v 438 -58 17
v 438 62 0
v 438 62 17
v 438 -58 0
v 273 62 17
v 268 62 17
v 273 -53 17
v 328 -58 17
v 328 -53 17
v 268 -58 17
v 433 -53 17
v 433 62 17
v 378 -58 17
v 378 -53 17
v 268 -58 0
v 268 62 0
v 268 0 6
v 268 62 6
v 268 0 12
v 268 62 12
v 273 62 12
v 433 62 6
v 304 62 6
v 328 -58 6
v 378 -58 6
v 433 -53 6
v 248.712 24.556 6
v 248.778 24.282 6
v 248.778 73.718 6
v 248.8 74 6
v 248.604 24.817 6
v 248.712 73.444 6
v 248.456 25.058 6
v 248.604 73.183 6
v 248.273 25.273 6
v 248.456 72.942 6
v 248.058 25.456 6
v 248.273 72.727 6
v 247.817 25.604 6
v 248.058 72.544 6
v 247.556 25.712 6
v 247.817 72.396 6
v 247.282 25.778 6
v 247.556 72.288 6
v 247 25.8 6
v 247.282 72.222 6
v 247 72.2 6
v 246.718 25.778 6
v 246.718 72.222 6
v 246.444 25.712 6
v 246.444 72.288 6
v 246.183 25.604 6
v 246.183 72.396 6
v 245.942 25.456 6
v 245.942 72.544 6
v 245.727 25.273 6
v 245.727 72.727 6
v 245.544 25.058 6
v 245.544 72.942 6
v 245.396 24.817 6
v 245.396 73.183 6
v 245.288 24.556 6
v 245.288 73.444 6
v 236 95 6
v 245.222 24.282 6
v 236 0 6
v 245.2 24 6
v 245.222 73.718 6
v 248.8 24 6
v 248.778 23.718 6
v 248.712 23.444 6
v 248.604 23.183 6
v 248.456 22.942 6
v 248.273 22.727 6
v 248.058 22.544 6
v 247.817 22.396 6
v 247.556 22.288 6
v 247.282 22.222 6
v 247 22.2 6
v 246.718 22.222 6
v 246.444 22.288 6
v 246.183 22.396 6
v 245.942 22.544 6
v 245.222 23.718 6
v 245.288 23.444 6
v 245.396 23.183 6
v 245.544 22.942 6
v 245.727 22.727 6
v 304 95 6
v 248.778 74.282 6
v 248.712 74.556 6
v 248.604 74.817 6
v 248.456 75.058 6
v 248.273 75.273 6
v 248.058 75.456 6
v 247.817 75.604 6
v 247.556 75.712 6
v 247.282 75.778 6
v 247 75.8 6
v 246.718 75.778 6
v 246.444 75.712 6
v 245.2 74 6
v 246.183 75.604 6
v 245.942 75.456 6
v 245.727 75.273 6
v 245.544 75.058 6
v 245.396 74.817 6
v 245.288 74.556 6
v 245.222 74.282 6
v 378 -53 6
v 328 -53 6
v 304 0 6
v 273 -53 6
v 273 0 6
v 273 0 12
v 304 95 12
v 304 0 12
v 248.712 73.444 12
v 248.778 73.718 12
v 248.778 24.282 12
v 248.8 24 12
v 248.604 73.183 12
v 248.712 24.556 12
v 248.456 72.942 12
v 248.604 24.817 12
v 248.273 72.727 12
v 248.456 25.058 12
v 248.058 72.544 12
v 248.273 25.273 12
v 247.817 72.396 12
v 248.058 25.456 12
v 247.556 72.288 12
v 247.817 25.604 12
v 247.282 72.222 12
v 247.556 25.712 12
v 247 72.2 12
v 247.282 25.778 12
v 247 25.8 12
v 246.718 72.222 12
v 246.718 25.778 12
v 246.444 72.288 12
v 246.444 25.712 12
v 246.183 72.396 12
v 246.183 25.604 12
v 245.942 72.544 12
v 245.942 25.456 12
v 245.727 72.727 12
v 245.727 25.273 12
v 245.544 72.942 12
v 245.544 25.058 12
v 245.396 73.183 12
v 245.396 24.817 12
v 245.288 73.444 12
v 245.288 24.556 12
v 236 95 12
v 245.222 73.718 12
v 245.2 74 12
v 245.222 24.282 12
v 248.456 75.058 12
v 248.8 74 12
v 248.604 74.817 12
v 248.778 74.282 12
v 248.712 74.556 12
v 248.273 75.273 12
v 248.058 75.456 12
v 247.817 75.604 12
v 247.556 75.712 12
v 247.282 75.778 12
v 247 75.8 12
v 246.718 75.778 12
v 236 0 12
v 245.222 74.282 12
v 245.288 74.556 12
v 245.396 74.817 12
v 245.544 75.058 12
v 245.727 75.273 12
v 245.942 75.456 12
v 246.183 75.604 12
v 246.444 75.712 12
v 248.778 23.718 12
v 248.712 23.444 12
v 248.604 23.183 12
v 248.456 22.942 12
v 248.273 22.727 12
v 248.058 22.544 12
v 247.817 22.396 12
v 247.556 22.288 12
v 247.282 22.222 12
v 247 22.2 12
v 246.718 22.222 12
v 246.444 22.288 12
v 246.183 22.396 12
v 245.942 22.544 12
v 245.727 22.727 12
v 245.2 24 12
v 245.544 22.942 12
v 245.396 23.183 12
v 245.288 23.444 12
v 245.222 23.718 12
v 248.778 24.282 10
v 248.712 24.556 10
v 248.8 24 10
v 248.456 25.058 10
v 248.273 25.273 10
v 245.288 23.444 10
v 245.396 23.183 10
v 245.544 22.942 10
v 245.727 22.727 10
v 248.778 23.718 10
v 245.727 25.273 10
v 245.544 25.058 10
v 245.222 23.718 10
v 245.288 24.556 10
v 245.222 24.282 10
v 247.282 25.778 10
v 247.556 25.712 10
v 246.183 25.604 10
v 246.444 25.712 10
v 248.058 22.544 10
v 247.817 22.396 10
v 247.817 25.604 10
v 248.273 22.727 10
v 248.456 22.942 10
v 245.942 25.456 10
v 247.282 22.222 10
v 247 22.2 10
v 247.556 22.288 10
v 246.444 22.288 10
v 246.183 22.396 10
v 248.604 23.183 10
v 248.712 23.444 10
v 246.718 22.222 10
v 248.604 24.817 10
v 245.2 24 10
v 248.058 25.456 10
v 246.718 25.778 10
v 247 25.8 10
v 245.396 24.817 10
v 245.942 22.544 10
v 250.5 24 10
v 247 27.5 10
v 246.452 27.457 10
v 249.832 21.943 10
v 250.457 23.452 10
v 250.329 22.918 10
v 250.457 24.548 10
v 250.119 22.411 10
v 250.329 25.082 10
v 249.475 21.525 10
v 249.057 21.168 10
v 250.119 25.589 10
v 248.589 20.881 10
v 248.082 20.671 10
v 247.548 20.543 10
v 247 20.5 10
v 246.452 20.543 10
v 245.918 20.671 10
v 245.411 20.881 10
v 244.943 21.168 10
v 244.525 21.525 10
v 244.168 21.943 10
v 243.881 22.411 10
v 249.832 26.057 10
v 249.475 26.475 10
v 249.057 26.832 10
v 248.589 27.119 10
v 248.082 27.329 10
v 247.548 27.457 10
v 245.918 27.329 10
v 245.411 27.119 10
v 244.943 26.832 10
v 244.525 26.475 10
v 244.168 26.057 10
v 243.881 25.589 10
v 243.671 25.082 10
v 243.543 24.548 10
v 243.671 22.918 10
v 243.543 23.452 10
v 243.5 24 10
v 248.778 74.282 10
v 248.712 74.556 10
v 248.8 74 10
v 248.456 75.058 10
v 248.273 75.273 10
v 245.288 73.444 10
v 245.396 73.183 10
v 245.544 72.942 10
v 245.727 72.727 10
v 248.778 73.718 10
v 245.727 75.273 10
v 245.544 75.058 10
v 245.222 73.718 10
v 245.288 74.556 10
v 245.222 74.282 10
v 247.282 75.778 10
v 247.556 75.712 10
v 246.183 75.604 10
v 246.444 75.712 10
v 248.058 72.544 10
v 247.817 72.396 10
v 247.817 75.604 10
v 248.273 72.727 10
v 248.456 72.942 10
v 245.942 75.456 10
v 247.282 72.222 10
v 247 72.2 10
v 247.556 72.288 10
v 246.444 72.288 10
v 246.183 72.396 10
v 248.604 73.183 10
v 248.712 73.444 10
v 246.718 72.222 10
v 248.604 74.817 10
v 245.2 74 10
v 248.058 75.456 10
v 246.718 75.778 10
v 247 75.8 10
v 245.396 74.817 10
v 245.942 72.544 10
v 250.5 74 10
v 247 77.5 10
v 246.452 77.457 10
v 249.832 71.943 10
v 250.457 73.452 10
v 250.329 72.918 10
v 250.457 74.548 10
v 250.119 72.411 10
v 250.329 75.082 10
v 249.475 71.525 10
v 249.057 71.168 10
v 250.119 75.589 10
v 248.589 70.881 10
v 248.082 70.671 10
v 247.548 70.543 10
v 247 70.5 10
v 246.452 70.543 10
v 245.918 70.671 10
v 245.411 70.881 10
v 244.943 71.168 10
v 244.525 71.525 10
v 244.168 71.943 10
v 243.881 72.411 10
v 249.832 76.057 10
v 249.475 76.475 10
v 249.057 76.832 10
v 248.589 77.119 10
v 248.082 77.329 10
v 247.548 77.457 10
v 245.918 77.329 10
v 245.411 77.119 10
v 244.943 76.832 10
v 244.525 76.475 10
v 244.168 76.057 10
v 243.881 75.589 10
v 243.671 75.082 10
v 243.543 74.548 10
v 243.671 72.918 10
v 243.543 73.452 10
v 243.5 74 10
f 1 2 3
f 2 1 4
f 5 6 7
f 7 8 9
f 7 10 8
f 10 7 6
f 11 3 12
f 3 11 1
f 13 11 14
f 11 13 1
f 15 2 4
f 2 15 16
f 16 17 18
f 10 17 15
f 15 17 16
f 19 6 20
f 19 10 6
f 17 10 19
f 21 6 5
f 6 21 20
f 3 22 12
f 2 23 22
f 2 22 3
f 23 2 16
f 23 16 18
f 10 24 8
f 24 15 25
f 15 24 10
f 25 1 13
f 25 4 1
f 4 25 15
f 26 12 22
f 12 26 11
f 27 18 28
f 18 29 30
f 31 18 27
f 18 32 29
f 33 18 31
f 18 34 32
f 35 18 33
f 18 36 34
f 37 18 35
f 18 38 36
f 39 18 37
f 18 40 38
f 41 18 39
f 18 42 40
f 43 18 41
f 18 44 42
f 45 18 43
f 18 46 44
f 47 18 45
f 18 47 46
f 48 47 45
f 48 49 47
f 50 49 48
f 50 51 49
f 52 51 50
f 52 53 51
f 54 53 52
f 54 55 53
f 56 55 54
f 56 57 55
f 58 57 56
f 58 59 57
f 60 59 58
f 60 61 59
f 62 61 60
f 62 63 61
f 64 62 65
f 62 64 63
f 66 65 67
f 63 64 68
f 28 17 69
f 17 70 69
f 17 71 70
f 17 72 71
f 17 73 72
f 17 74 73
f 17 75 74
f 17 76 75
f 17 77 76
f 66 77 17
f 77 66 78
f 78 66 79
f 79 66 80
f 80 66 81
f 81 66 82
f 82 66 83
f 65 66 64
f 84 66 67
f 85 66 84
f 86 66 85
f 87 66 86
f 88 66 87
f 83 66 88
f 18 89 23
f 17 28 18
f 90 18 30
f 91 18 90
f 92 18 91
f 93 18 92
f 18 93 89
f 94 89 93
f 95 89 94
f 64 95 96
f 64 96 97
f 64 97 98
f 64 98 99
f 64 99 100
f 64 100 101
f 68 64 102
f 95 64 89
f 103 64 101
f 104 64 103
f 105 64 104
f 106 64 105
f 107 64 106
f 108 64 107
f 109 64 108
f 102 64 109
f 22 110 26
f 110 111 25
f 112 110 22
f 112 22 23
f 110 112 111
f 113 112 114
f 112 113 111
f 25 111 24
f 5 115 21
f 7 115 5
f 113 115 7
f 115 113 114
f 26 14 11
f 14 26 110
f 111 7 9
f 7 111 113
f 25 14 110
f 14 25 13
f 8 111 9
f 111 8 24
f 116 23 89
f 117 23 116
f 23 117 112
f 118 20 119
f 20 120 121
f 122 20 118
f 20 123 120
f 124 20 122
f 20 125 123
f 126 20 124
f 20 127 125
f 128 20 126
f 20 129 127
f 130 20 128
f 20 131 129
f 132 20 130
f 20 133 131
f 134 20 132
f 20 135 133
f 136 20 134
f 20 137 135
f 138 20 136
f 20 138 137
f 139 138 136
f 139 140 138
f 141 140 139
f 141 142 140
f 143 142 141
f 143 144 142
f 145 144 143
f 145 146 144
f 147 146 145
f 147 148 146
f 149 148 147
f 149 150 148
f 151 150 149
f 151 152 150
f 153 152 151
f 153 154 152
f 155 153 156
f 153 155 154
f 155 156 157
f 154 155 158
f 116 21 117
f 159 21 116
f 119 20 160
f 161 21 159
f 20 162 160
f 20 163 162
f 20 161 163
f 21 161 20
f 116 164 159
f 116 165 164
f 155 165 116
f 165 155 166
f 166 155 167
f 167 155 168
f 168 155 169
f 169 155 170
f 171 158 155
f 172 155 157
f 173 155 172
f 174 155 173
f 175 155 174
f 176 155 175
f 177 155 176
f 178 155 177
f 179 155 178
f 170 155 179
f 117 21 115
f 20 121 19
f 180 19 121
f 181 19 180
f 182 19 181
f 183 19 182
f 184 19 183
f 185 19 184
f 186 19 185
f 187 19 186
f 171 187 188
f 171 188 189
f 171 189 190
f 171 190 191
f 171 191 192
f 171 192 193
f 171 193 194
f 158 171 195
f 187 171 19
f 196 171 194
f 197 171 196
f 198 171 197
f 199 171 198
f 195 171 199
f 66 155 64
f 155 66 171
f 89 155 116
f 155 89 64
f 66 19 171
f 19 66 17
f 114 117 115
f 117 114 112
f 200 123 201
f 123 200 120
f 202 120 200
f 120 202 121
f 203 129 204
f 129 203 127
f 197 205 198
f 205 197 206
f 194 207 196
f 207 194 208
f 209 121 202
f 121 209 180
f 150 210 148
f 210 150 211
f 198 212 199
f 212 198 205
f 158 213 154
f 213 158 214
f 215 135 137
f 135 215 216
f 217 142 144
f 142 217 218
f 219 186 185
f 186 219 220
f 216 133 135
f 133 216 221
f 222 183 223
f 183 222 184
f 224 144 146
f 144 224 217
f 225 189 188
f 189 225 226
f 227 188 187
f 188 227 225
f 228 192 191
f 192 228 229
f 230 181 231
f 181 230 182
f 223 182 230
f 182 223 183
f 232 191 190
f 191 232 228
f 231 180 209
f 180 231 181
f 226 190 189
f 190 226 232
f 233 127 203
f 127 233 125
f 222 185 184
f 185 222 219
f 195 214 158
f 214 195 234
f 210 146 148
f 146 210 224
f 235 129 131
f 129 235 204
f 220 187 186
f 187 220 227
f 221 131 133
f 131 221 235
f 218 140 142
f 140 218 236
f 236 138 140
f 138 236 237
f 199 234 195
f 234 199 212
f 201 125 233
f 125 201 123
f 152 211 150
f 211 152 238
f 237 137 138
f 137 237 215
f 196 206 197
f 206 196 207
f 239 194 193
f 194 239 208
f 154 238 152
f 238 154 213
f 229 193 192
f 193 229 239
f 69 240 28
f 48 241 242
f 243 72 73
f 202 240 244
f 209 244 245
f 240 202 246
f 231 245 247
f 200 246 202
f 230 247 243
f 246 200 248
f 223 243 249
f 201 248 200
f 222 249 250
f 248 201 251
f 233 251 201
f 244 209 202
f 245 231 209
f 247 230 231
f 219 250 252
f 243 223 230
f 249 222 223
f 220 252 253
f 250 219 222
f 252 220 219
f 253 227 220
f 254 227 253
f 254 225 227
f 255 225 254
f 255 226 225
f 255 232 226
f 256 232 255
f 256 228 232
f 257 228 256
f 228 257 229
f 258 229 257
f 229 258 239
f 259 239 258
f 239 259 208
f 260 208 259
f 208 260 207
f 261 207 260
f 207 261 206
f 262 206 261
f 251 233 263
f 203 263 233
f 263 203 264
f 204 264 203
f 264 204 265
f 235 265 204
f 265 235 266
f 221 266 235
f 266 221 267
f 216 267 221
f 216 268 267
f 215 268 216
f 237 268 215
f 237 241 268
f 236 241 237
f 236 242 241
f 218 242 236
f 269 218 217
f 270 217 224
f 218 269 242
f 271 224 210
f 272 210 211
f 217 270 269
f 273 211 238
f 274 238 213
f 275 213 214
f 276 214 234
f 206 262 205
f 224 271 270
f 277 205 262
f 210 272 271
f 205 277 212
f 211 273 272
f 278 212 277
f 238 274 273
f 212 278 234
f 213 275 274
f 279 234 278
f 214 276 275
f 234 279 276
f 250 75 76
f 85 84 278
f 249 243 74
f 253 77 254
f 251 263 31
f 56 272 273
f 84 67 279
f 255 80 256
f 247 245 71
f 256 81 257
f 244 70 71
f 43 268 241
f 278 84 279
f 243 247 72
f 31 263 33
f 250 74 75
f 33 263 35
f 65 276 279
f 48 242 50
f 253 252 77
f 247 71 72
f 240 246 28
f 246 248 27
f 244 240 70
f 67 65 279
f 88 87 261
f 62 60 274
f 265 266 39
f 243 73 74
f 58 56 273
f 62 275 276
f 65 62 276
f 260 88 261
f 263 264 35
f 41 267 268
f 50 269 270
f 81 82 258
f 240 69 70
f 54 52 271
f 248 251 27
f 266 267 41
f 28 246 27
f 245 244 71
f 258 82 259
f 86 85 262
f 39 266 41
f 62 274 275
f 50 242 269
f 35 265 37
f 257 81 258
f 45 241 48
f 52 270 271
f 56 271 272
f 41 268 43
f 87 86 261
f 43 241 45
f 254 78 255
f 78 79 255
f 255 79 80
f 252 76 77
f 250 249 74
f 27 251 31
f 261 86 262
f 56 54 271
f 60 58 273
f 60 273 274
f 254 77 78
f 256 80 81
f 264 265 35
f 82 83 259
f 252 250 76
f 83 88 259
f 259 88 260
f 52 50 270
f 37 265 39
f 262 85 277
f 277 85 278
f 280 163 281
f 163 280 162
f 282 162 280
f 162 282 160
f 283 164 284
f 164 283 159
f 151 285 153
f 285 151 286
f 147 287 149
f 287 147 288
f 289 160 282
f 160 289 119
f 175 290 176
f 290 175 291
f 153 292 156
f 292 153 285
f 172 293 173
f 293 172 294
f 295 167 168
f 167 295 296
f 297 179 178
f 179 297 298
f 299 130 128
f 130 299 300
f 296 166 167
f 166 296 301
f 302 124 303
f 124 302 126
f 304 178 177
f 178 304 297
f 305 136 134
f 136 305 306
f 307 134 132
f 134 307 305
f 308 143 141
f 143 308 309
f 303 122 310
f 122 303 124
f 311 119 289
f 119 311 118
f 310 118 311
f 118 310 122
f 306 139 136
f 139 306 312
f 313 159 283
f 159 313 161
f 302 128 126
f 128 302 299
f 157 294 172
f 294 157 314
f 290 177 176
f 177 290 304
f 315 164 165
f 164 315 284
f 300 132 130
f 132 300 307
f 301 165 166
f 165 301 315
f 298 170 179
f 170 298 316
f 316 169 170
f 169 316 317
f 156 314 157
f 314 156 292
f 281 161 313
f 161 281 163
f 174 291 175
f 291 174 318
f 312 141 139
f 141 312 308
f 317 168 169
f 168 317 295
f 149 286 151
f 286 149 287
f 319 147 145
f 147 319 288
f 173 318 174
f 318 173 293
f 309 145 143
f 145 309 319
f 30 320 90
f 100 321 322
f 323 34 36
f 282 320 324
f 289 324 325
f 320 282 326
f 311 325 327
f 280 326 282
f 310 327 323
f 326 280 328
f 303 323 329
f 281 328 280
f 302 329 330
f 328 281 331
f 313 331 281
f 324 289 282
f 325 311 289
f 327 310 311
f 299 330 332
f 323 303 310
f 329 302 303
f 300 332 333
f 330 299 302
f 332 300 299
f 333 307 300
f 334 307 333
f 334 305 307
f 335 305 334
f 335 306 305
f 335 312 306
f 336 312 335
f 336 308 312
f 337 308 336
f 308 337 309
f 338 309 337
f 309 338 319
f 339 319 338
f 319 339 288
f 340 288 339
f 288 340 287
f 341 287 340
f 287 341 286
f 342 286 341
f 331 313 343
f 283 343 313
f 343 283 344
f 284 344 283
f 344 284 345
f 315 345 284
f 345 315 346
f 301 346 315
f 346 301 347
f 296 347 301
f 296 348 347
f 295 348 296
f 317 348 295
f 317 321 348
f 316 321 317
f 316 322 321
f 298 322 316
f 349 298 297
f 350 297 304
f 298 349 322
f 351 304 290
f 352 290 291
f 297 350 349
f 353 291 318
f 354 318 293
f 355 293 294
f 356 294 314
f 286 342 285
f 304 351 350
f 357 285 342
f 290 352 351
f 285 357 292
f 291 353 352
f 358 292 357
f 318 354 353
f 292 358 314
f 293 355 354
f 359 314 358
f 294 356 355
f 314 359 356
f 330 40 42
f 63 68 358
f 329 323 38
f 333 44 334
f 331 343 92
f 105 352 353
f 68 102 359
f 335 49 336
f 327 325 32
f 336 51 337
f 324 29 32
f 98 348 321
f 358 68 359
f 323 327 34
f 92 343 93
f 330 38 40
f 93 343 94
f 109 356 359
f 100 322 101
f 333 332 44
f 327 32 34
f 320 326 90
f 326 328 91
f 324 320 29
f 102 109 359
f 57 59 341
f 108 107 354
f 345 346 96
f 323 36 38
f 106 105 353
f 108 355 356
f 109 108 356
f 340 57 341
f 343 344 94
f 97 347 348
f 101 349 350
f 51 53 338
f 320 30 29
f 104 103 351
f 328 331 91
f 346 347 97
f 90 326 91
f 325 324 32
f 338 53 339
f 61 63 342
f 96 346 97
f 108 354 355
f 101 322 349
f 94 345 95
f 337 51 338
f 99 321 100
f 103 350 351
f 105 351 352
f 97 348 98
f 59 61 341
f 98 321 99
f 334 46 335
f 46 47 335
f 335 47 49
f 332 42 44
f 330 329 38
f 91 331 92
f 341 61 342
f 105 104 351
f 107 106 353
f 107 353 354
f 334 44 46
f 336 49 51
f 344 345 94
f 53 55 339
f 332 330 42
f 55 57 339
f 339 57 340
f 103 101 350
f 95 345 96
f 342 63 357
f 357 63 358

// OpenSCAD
// file: vj_rig_stand_common.scad
// vj_rig_stand_common.scad — shared library for the VJ rig stand.
//
// Holds an iPad (TouchOSC) in an angled cradle behind the keyboard, an Apple
// Magic Trackpad in a tray that partly frames the keyboard's right side, and a
// 3x Lightning cable holder. Two parts (combined unit is wider than the bed):
//
//   vj_cradle()  — iPad cradle + cable bar (left/center section)
//   vj_tray()    — trackpad tray + connecting arm (right section)
//
// They bolt together at a flange (2 screws; glue-compatible). Variants
// `vj_rig_stand_cradle.scad` / `_tray.scad` `include` this file.

/* [iPad cradle] */
cw        = 260;   // cradle width (iPad 8 cased ≈ 257); keeps the part under the 270 bed
ipad_ang  = 65;    // lean from horizontal
chan_w    = 16;    // bottom channel for the cased iPad (flip cover folds behind)
panel_t   = 8;     // rest-panel thickness
panel_len = 130;   // rest-panel length up the slope
lip_h     = 20;    // front lip catching the iPad bottom edge
gusset_d  = 52;    // wedge depth (front to vertical back)
foot_d    = 95;    // base foot depth

/* [Trackpad tray] */
tp_w   = 160; tp_d = 115;   // Magic Trackpad
tp_wall = 5; tp_lip = 11;   // tray walls / lip
arm_w  = 44;                // connecting arm width
tray_fwd = 58;              // how far the tray is slid forward of the cradle front

/* [Cables] */
cable_n = 3; cable_d = 9; cable_pitch = 40;

/* [Build] */
base_t = 6;
join_overlap = 24;          // cradle ledge width the tray bolts onto
screw_d = 3.6; screw_head = 7; pilot_d = 2.8;
$fn = 40;

// joint screws: in the cradle's right edge; the tray's arm laps on top and bolts down
join_screws = [[cw - 13, 24], [cw - 13, 74]];

module vj_cradle() {
    difference() {
        union() {
            cube([cw, foot_d, base_t]);                                   // base foot
            for (x = [0, cw - 12]) translate([x, 0, base_t]) rotate([90, 0, 90]) // side gussets
                linear_extrude(12) polygon([[0,0], [gusset_d,0], [gusset_d, gusset_d*tan(ipad_ang)]]);
            translate([0, chan_w, base_t]) rotate([-(90 - ipad_ang), 0, 0])      // iPad rest panel
                cube([cw, panel_t, panel_len]);
            cube([cw, 4, base_t + lip_h]);                                // front lip / channel front
            difference() {                                                // cable bar
                translate([cw/2 - (cable_n*cable_pitch)/2 - 10, foot_d - 20, base_t]) cube([cable_n*cable_pitch + 20, 18, 22]);
                for (i = [0 : cable_n-1]) translate([cw/2 + (i - (cable_n-1)/2)*cable_pitch, foot_d - 26, base_t + 14]) rotate([90,0,0]) cylinder(d = cable_d, h = 30);
            }
        }
        for (p = join_screws) translate([p[0], p[1], -1]) cylinder(h = base_t + 2, d = pilot_d); // pilots (screw from above)
    }
}

module vj_tray() {
    difference() {
        union() {
            // arm laps over the cradle's right edge (z = base_t) and reaches the tray
            translate([cw - join_overlap, 0, base_t]) cube([join_overlap + arm_w, foot_d, base_t]);
            translate([cw + 8, -tray_fwd, 0]) difference() {                          // trackpad tray (on desk)
                cube([tp_w + 2*tp_wall, tp_d + tp_wall, base_t + tp_lip]);
                translate([tp_wall, tp_wall, base_t]) cube([tp_w, tp_d, tp_lip + 1]);
                translate([(tp_w + 2*tp_wall)/2 - 25, -1, base_t]) cube([50, tp_wall + 2, tp_lip + 1]); // finger relief
            }
        }
        for (p = join_screws) translate([p[0], p[1], base_t - 1]) {                    // countersunk screws down into cradle
            cylinder(h = base_t + 2, d = screw_d);
            translate([0, 0, 1]) cylinder(h = 4, d1 = screw_d, d2 = screw_head);
        }
    }
}
// main file
// vj_rig_stand_tray — Magic Trackpad tray + connecting arm (right section).
// Render: openscad -o ..._tray.stl --export-format binstl vj_rig_stand_tray.scad
include <vj_rig_stand_common.scad>

vj_tray();
